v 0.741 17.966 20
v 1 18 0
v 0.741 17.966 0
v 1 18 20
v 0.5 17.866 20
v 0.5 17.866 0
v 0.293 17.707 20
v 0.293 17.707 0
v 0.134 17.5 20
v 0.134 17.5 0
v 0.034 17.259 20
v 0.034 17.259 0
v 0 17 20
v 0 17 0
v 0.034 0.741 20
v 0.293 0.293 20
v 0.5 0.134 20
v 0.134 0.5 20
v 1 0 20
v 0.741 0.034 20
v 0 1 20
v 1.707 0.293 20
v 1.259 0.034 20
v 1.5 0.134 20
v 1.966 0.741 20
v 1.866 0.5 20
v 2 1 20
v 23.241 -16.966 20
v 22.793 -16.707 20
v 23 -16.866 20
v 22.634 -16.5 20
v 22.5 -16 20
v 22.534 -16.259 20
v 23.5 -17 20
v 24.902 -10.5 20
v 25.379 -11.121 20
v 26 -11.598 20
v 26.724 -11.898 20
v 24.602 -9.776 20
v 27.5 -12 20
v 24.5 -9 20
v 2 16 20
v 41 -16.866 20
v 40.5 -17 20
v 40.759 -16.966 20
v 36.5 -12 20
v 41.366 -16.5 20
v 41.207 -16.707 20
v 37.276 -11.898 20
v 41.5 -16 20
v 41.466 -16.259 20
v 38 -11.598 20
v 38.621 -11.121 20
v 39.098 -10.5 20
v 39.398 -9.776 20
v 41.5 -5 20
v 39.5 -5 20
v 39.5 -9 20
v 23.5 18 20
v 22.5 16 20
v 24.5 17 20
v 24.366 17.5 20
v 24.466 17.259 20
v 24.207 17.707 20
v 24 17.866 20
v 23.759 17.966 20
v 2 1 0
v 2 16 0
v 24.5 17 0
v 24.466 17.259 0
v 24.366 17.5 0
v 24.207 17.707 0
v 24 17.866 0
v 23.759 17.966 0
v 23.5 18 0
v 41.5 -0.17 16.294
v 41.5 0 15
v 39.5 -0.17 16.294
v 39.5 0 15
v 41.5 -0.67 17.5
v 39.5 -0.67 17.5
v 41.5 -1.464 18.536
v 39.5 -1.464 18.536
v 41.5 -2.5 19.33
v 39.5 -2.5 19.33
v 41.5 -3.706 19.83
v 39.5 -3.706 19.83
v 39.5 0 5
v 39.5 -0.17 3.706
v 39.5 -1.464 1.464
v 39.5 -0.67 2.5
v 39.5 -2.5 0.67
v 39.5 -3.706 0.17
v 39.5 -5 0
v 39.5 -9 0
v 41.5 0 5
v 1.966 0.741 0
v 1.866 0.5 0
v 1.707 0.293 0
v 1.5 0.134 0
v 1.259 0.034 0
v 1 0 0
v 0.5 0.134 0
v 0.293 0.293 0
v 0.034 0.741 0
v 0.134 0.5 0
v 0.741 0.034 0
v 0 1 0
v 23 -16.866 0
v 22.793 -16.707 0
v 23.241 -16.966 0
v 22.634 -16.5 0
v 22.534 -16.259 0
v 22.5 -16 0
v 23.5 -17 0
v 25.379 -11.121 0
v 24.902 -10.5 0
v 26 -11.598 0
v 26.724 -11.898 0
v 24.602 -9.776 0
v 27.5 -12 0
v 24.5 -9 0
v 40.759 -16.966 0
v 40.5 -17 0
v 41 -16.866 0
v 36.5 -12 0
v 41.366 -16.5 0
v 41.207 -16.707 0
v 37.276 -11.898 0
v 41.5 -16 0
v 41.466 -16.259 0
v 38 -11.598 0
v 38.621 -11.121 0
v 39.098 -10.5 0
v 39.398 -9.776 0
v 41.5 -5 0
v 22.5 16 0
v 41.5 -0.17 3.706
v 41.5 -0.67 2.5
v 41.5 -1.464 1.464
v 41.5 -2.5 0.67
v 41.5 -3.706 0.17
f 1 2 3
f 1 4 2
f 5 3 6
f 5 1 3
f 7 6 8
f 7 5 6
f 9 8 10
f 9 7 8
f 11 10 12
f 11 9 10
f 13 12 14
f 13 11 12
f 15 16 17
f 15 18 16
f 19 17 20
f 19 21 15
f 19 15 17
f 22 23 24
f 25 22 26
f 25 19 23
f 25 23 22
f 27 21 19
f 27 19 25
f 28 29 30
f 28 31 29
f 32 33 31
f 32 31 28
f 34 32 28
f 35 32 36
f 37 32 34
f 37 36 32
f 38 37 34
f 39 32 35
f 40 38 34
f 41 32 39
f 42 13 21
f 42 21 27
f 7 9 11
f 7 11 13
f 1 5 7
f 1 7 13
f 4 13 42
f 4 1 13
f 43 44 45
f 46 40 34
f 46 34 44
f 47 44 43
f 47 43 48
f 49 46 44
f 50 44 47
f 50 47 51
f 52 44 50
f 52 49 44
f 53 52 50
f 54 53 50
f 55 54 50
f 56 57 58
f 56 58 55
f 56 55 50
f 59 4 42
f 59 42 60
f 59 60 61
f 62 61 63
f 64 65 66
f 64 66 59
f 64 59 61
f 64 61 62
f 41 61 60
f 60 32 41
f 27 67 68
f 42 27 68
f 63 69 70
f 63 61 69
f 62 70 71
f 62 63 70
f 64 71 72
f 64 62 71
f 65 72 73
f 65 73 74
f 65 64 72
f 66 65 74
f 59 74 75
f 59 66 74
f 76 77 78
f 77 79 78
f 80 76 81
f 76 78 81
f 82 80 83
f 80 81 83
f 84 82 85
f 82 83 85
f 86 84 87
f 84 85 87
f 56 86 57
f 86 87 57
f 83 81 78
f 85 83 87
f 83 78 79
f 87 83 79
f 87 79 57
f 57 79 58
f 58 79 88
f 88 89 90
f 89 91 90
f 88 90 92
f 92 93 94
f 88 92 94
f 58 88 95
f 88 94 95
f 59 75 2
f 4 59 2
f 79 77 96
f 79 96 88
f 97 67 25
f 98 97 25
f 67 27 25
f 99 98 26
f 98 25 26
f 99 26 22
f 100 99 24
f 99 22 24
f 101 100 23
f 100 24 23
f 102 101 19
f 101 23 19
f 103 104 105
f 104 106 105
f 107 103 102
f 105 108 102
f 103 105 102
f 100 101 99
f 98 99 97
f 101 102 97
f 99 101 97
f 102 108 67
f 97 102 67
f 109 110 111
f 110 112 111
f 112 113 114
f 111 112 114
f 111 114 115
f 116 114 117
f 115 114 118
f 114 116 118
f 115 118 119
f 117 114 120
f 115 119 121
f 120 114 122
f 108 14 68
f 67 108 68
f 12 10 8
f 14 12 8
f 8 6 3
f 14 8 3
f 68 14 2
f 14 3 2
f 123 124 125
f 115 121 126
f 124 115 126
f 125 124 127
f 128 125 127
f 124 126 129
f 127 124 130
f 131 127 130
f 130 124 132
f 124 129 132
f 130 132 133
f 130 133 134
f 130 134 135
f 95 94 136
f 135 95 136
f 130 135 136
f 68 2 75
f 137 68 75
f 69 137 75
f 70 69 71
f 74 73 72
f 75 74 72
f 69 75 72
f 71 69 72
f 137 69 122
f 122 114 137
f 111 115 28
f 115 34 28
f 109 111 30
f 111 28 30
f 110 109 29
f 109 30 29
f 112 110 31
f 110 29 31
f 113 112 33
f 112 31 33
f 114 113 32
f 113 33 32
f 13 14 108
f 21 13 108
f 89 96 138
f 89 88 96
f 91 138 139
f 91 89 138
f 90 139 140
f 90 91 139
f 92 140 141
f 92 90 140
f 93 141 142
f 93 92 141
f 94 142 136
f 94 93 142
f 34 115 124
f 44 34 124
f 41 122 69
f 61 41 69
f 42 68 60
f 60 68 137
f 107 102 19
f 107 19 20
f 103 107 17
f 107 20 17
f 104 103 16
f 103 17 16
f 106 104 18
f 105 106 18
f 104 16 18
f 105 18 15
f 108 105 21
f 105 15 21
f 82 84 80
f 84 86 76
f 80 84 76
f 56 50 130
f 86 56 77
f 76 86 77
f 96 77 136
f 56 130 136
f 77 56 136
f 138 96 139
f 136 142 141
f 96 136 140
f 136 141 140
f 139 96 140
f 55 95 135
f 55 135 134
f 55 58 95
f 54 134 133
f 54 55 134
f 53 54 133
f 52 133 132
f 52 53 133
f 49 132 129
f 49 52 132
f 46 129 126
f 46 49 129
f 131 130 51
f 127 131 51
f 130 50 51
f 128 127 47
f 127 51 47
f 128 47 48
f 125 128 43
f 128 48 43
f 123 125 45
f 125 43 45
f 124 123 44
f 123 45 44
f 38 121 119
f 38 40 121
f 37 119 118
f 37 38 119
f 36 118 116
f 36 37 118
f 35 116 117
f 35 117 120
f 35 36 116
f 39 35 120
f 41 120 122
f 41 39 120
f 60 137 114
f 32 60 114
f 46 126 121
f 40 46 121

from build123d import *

# Parameters (mm, degrees)
F1_DEPTH = 20
F2_R     = 5
F3_R     = 0.99999
F4_R     = 3


# Not quite as in the source:
# - a fillet or chamfer is up to 0.001 mm smaller than in the source, because OpenCascade refuses the exact size


with BuildPart() as f1:
    # F0 (on Top) → F1 (new body)
    with BuildSketch(Plane.XY):
        Polygon((0, 18), (0, 0), (2, 0), (2, 16), (22.5, 16), (22.5, -17), (41.5, -17), (41.5, 0), (39.5, 0), (39.5, -12), (24.5, -12), (24.5, 18), align=None)
    extrude(amount=F1_DEPTH)

    # F2
    f2_edges = [f1.edges().sort_by_distance(p)[0] for p in [
        (40.5, 0, 20),
        (40.5, 0, 0),
    ]]
    fillet(f2_edges, radius=F2_R)

    # F3 (radius 1 in the source; OpenCascade refuses exactly that, so slightly less here)
    f3_edges = [f1.edges().sort_by_distance(p)[0] for p in [
        (0, 18, 10),
        (24.5, 18, 10),
        (2, 0, 10),
        (22.5, -17, 10),
        (41.5, -17, 10),
        (0, 0, 10),
    ]]
    fillet(f3_edges, radius=F3_R)

    # F4
    f4_edges = [f1.edges().sort_by_distance(p)[0] for p in [
        (24.5, -12, 10),
        (39.5, -12, 10),
    ]]
    fillet(f4_edges, radius=F4_R)


solid = f1.part
